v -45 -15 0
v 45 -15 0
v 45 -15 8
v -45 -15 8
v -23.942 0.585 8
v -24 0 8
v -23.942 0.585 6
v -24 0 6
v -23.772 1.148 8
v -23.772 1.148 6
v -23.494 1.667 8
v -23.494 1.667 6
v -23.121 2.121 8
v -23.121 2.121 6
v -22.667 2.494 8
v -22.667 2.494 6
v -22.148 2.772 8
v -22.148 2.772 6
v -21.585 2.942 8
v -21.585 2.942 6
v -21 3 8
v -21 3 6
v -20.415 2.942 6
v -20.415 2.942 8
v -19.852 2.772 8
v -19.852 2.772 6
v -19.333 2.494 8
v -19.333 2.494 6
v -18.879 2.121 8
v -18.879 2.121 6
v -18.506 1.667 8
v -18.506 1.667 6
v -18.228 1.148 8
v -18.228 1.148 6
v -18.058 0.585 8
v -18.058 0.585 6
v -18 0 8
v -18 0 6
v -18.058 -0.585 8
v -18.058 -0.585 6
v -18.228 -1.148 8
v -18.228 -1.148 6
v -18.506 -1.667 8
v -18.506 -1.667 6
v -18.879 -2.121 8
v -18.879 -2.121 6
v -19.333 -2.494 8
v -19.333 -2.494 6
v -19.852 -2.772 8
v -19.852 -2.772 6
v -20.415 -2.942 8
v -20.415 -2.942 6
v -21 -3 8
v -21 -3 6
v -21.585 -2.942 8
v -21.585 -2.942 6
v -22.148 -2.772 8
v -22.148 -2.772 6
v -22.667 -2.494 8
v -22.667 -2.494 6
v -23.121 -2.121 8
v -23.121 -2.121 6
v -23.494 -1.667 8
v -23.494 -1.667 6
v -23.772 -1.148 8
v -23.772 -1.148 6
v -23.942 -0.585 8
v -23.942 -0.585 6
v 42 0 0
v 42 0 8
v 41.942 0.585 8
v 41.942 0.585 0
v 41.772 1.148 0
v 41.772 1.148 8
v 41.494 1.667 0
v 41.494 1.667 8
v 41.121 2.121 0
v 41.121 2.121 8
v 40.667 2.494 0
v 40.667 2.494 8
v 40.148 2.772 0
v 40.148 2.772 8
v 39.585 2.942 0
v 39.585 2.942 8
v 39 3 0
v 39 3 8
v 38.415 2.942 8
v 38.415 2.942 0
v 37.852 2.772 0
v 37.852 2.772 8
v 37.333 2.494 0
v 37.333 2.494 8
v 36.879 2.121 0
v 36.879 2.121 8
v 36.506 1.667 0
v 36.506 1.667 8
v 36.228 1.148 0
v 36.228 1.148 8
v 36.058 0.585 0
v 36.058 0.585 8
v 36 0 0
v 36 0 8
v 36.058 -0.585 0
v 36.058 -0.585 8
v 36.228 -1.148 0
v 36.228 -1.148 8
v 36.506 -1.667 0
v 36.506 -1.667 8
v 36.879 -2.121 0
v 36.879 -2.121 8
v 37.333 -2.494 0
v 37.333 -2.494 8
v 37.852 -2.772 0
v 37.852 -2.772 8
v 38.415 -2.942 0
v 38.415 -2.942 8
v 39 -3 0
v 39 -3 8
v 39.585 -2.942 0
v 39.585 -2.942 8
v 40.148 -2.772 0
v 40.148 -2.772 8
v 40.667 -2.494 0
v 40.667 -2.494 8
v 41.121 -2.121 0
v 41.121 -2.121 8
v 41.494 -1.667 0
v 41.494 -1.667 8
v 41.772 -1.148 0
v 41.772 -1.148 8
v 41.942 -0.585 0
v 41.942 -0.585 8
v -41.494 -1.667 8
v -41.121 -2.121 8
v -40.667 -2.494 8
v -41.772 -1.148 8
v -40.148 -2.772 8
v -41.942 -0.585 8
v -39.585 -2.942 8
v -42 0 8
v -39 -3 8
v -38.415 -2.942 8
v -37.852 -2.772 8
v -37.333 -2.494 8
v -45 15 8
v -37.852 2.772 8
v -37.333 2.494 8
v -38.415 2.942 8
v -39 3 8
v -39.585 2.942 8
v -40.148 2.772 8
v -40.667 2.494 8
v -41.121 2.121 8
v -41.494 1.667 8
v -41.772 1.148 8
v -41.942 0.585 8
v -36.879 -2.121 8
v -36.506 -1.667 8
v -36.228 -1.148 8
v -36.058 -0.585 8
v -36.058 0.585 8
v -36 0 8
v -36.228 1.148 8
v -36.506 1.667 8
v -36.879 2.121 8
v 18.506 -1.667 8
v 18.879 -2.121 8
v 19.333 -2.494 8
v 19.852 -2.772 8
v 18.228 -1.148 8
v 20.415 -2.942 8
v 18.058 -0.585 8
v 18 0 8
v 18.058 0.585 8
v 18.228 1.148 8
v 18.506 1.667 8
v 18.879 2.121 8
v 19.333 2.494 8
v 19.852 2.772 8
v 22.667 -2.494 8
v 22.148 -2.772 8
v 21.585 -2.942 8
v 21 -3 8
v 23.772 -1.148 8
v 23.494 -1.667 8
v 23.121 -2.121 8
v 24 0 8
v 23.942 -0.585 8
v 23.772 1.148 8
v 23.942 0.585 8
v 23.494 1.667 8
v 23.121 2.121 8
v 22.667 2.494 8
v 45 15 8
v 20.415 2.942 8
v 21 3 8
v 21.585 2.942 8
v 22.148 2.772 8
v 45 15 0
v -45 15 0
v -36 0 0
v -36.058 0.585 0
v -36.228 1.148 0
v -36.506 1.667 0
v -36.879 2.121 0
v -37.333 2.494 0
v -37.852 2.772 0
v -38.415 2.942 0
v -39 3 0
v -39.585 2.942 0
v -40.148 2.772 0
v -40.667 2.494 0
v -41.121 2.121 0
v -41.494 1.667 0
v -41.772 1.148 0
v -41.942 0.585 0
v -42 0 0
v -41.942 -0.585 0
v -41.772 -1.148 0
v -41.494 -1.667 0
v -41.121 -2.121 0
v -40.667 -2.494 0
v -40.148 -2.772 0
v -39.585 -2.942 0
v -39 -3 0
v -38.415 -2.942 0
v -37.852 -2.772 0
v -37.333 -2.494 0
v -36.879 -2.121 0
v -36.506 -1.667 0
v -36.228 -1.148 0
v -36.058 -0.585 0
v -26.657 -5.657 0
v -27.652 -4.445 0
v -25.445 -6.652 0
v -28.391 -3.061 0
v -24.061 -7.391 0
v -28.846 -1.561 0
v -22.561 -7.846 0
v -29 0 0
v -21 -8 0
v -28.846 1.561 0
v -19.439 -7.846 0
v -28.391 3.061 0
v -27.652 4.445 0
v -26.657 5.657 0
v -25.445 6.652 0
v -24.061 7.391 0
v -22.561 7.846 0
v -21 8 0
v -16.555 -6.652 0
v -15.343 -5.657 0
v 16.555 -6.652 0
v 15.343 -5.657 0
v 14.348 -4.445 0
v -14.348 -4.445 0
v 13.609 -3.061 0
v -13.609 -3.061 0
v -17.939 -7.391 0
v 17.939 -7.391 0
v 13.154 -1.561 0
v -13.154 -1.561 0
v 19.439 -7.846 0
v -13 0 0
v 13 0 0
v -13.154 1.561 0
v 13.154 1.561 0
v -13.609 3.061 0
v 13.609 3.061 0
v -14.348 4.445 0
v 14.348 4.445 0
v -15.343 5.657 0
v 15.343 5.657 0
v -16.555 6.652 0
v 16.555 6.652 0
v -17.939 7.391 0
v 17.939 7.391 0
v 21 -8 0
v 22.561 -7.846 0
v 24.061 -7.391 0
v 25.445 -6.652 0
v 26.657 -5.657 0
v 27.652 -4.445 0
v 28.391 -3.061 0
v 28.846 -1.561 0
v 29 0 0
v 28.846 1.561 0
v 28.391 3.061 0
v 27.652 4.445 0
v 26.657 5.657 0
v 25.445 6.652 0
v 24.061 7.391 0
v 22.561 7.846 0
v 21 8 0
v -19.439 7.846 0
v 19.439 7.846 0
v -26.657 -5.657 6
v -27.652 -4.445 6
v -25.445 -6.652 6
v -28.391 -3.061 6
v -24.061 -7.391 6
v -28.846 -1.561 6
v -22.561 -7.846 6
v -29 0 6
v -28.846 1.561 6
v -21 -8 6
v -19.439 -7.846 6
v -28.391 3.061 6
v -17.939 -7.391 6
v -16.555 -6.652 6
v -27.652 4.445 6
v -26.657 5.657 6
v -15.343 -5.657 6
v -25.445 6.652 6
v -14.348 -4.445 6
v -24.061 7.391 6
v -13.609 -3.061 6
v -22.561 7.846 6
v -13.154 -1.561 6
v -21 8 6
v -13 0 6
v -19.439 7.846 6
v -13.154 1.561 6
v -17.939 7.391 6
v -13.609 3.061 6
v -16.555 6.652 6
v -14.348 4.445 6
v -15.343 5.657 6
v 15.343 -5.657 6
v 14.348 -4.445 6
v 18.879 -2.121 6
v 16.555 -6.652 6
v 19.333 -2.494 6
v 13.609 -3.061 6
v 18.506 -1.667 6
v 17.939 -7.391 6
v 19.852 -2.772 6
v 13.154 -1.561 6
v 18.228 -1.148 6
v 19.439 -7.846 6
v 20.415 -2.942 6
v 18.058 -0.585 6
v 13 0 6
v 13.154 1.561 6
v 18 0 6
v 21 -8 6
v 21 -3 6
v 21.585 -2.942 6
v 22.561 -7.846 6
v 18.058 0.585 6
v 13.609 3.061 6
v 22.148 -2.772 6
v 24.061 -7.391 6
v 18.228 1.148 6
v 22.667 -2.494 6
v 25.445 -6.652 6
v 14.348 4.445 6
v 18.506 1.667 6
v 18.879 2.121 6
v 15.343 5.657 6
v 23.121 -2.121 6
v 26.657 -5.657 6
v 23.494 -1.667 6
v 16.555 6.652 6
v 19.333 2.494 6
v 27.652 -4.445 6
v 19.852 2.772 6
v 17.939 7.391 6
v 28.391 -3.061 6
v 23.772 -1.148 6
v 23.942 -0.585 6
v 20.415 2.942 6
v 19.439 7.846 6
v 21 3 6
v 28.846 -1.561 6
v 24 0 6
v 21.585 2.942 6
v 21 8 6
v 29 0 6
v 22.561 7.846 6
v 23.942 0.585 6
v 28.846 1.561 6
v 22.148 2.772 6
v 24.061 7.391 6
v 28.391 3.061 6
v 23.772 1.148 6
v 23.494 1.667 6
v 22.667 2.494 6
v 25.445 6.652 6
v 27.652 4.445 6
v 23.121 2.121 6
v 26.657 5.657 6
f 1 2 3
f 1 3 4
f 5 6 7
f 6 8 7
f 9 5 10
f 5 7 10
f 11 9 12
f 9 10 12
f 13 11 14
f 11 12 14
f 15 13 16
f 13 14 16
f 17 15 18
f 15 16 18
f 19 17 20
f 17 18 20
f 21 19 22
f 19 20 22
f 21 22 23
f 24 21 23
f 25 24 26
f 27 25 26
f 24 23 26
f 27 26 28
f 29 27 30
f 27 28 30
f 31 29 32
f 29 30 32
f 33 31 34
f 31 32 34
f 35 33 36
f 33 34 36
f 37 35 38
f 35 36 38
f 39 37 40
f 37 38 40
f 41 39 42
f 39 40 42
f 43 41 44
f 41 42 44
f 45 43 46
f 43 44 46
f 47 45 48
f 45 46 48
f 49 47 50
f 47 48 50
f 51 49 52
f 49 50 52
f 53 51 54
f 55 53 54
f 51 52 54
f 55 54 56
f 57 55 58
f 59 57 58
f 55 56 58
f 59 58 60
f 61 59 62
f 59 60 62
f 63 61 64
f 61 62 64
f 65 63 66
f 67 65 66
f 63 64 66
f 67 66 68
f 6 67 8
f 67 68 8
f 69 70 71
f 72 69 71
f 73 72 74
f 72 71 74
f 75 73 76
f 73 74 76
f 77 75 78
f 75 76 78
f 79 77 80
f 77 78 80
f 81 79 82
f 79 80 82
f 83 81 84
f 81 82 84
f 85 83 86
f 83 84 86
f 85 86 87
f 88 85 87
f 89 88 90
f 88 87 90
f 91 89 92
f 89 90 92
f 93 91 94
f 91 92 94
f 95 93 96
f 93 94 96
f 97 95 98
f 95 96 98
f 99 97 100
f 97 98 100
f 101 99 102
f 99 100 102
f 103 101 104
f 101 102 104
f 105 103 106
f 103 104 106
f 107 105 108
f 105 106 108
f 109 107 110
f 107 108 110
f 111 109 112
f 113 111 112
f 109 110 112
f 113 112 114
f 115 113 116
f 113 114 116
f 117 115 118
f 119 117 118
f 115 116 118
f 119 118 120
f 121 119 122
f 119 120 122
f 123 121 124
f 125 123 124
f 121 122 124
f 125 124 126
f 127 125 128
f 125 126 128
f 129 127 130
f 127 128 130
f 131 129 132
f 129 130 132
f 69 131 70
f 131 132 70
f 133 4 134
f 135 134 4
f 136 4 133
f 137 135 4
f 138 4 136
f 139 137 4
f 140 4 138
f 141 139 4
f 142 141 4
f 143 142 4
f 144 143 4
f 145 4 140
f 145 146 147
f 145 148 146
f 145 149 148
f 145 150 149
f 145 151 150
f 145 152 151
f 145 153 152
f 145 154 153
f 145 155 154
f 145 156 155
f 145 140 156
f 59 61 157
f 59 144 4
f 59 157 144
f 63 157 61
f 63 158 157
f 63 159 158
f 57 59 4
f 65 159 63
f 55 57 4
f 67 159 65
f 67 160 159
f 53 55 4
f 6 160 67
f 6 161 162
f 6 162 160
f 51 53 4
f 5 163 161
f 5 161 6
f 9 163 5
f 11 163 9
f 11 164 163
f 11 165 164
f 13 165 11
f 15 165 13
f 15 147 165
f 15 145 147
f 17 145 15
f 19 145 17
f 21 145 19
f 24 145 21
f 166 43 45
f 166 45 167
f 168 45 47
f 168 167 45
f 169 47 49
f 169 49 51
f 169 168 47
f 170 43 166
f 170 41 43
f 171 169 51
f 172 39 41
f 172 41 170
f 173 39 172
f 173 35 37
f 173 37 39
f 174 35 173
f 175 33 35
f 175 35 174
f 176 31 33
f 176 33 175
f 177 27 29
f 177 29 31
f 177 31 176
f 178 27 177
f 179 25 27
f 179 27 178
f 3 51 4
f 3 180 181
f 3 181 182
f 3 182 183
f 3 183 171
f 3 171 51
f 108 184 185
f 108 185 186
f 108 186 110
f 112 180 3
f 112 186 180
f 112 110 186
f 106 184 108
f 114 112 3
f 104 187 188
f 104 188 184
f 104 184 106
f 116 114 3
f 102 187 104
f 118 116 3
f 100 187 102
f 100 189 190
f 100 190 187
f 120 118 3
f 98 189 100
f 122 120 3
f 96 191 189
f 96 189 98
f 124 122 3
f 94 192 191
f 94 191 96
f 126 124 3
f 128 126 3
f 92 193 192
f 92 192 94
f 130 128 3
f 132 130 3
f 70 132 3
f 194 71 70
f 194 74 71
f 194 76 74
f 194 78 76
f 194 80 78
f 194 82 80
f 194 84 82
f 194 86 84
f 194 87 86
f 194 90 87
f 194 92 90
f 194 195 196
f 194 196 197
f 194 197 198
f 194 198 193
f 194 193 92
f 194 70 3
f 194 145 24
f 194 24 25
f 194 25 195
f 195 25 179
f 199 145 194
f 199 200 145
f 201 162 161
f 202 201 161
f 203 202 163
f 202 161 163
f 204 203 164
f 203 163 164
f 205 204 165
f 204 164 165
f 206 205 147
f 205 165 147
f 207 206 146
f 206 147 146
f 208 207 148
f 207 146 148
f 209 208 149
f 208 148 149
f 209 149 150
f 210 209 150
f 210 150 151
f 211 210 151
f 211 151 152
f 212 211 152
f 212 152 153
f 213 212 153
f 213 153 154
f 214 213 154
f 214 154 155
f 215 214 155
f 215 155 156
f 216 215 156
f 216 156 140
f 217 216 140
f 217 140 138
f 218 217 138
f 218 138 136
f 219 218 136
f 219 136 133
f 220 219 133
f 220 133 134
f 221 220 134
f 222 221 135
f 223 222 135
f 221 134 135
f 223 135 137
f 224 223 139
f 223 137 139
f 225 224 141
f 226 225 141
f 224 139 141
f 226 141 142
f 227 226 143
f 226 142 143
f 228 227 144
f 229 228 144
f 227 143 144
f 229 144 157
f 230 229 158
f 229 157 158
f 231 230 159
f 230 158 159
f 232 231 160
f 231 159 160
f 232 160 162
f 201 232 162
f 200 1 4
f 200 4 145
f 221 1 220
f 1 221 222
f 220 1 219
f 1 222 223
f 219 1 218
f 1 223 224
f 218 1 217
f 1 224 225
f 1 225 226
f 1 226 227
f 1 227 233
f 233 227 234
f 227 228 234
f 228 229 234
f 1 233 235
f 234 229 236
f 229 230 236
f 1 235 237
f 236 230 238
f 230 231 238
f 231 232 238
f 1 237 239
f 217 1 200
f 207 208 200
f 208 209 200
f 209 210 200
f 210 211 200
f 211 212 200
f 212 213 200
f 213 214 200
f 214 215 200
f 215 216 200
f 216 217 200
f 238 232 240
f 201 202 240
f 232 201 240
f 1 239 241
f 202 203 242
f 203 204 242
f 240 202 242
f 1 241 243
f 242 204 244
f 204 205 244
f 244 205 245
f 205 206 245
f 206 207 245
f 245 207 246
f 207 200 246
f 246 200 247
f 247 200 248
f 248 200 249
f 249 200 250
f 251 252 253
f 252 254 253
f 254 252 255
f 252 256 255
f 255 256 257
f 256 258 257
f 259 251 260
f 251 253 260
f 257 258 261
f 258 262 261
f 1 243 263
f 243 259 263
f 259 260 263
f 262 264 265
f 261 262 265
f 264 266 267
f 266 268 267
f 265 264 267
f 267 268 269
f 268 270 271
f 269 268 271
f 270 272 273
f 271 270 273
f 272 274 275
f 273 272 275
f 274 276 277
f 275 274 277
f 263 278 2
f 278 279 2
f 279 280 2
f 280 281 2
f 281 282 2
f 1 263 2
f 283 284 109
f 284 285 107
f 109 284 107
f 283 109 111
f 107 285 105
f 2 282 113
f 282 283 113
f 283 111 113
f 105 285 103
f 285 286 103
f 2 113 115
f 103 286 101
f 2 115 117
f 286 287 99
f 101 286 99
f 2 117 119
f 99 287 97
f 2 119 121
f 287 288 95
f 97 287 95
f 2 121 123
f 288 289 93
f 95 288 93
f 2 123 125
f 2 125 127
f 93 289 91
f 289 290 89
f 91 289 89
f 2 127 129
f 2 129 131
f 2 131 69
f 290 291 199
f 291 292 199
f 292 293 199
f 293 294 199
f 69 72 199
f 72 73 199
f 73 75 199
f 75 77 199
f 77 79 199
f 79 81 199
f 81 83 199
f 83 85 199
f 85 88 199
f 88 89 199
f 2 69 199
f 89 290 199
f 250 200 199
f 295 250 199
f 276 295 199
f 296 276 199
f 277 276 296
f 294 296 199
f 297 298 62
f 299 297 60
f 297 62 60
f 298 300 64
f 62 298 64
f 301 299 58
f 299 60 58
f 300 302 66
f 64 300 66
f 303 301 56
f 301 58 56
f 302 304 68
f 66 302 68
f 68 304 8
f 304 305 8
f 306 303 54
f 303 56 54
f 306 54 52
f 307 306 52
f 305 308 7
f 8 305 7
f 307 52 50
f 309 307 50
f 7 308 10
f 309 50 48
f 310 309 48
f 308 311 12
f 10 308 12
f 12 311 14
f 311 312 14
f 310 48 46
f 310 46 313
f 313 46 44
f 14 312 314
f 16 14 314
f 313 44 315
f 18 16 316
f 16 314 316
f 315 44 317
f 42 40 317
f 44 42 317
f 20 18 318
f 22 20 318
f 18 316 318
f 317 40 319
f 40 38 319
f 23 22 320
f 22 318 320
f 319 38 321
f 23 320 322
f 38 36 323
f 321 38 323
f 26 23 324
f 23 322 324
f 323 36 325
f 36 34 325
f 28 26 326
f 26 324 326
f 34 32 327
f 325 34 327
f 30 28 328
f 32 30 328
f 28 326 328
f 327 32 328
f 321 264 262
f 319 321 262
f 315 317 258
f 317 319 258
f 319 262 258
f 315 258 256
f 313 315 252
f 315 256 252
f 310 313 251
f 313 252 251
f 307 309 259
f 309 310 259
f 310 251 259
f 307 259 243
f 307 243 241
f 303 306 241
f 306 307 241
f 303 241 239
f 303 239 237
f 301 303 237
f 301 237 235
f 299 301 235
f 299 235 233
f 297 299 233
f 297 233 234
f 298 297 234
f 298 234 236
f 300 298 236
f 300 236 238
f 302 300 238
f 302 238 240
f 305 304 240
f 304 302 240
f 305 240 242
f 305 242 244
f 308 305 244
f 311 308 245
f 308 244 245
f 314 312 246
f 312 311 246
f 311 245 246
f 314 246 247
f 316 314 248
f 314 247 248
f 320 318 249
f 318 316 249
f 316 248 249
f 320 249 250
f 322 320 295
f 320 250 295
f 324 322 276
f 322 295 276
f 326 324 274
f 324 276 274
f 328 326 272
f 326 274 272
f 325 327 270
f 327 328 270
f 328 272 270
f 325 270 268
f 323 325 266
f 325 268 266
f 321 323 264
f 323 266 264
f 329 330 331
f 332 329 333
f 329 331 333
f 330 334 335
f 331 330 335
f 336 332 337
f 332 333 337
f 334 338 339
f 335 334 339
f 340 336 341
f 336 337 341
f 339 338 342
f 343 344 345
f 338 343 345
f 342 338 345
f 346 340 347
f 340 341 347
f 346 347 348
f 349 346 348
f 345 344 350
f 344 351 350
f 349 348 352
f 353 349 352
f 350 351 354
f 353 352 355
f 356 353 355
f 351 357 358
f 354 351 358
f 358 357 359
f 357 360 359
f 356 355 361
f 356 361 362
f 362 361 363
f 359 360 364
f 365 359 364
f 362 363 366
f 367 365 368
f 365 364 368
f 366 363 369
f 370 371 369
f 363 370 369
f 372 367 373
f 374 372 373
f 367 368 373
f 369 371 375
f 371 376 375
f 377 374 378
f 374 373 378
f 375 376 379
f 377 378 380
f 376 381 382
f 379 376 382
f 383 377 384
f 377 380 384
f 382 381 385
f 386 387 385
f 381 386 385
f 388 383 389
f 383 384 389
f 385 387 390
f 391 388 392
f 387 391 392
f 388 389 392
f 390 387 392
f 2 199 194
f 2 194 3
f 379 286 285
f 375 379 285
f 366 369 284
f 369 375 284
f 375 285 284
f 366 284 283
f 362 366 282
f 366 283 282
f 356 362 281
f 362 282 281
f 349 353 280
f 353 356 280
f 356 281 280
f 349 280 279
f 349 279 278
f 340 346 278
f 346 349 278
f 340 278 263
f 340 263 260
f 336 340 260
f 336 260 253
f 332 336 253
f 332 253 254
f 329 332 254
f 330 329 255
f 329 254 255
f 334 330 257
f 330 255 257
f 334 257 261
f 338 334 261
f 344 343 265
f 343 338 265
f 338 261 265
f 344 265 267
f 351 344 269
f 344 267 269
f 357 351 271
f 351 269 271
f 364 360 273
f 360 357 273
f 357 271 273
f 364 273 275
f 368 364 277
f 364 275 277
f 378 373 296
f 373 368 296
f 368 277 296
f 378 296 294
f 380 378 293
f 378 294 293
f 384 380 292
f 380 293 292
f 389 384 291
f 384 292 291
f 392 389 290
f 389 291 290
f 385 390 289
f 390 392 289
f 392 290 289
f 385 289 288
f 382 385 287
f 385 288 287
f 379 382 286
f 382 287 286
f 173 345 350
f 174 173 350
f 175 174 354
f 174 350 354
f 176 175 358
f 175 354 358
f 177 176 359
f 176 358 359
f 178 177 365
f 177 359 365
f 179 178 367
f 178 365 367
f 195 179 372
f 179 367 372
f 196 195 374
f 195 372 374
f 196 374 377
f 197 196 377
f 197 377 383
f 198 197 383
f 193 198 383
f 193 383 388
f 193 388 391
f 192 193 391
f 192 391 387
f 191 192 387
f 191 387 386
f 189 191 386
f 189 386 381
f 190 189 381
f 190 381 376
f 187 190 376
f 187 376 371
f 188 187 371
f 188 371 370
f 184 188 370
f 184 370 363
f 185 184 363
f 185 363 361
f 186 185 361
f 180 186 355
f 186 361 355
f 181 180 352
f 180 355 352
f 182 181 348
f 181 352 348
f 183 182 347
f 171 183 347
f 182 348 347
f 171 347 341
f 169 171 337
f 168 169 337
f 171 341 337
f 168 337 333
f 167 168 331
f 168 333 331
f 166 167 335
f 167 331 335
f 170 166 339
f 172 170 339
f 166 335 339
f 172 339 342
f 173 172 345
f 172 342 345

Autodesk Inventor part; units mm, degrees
ref_plane "YZ Plane" through (0, 0, 0) normal (1, 0, 0) x (0, 1, 0)
ref_plane "XZ Plane" through (0, 0, 0) normal (0, 1, 0) x (-1, 0, 0)
ref_plane "XY Plane" through (0, 0, 0) normal (0, 0, 1) x (1, 0, 0)
sketch "Sketch1" plane through (0, 0, 0) normal (0, 0, 1) x (1, 0, 0)
  circle A0 centre (-21, 0) radius 8
  circle A1 centre (21, 0) radius 8
  line L0 (-45, 15) -> (45, 15)
  line L1 (45, 15) -> (45, -15)
  line L2 (45, -15) -> (-45, -15)
  line L3 (-45, -15) -> (-45, 15)
  point P0 (0, 0)
  dimension "d0" = 16
  dimension "d1" = 16
  dimension "d2" = 42
  dimension "d3" = 21
  dimension "d4" = 15
  dimension "d5" = 30
  dimension "d6" = 16
  dimension "d7" = 16
extrude "Extrusion1" add sketch "Sketch1" along normal blind 8
sketch "Sketch2" plane through (0, 0, 8) normal (0, 0, 1) x (1, 0, 0)
  circle A0 centre (-21, 0) radius 8 projected
  circle A1 centre (21, 0) radius 8 projected
  point P0 (0, 0)
extrude "Extrusion2" add sketch "Sketch2" against normal blind 2
sketch "Sketch3" plane through (21, 0, 6) normal (0, 0, -1) x (-1, 0, 0)
  circle A0 centre (0, 0) radius 8 projected
  circle A1 centre (42, 0) radius 8 projected
  circle A2 centre (0, 0) radius 3
  circle A3 centre (42, 0) radius 3
  point P0 (21, 0)
  dimension "d12" = 6
  dimension "d13" = 6
extrude "Extrusion3" cut sketch "Sketch3" against normal through all contours A2 | A3
sketch "Sketch4" plane through (0, 0, 8) normal (0, 0, 1) x (1, 0, 0)
  circle A0 centre (-39, 0) radius 3
  circle A1 centre (39, 0) radius 3
  line L0 (-45, 15) -> (-45, -15) projected
  line L1 (45, 15) -> (45, -15) projected
  point P0 (0, 0)
  dimension "d16" = 6
  dimension "d17" = 6
  dimension "d18" = 6
  dimension "d19" = 6
extrude "Extrusion4" cut sketch "Sketch4" against normal through all
equation "\"d1\" = d0"
equation "\"d3\" = 0.5 * d2"
equation "\"d4\" = 0.5 * d5"
equation "\"d7\" = d6"
equation "\"d19\" = d18"
properties part number "bearing support"
